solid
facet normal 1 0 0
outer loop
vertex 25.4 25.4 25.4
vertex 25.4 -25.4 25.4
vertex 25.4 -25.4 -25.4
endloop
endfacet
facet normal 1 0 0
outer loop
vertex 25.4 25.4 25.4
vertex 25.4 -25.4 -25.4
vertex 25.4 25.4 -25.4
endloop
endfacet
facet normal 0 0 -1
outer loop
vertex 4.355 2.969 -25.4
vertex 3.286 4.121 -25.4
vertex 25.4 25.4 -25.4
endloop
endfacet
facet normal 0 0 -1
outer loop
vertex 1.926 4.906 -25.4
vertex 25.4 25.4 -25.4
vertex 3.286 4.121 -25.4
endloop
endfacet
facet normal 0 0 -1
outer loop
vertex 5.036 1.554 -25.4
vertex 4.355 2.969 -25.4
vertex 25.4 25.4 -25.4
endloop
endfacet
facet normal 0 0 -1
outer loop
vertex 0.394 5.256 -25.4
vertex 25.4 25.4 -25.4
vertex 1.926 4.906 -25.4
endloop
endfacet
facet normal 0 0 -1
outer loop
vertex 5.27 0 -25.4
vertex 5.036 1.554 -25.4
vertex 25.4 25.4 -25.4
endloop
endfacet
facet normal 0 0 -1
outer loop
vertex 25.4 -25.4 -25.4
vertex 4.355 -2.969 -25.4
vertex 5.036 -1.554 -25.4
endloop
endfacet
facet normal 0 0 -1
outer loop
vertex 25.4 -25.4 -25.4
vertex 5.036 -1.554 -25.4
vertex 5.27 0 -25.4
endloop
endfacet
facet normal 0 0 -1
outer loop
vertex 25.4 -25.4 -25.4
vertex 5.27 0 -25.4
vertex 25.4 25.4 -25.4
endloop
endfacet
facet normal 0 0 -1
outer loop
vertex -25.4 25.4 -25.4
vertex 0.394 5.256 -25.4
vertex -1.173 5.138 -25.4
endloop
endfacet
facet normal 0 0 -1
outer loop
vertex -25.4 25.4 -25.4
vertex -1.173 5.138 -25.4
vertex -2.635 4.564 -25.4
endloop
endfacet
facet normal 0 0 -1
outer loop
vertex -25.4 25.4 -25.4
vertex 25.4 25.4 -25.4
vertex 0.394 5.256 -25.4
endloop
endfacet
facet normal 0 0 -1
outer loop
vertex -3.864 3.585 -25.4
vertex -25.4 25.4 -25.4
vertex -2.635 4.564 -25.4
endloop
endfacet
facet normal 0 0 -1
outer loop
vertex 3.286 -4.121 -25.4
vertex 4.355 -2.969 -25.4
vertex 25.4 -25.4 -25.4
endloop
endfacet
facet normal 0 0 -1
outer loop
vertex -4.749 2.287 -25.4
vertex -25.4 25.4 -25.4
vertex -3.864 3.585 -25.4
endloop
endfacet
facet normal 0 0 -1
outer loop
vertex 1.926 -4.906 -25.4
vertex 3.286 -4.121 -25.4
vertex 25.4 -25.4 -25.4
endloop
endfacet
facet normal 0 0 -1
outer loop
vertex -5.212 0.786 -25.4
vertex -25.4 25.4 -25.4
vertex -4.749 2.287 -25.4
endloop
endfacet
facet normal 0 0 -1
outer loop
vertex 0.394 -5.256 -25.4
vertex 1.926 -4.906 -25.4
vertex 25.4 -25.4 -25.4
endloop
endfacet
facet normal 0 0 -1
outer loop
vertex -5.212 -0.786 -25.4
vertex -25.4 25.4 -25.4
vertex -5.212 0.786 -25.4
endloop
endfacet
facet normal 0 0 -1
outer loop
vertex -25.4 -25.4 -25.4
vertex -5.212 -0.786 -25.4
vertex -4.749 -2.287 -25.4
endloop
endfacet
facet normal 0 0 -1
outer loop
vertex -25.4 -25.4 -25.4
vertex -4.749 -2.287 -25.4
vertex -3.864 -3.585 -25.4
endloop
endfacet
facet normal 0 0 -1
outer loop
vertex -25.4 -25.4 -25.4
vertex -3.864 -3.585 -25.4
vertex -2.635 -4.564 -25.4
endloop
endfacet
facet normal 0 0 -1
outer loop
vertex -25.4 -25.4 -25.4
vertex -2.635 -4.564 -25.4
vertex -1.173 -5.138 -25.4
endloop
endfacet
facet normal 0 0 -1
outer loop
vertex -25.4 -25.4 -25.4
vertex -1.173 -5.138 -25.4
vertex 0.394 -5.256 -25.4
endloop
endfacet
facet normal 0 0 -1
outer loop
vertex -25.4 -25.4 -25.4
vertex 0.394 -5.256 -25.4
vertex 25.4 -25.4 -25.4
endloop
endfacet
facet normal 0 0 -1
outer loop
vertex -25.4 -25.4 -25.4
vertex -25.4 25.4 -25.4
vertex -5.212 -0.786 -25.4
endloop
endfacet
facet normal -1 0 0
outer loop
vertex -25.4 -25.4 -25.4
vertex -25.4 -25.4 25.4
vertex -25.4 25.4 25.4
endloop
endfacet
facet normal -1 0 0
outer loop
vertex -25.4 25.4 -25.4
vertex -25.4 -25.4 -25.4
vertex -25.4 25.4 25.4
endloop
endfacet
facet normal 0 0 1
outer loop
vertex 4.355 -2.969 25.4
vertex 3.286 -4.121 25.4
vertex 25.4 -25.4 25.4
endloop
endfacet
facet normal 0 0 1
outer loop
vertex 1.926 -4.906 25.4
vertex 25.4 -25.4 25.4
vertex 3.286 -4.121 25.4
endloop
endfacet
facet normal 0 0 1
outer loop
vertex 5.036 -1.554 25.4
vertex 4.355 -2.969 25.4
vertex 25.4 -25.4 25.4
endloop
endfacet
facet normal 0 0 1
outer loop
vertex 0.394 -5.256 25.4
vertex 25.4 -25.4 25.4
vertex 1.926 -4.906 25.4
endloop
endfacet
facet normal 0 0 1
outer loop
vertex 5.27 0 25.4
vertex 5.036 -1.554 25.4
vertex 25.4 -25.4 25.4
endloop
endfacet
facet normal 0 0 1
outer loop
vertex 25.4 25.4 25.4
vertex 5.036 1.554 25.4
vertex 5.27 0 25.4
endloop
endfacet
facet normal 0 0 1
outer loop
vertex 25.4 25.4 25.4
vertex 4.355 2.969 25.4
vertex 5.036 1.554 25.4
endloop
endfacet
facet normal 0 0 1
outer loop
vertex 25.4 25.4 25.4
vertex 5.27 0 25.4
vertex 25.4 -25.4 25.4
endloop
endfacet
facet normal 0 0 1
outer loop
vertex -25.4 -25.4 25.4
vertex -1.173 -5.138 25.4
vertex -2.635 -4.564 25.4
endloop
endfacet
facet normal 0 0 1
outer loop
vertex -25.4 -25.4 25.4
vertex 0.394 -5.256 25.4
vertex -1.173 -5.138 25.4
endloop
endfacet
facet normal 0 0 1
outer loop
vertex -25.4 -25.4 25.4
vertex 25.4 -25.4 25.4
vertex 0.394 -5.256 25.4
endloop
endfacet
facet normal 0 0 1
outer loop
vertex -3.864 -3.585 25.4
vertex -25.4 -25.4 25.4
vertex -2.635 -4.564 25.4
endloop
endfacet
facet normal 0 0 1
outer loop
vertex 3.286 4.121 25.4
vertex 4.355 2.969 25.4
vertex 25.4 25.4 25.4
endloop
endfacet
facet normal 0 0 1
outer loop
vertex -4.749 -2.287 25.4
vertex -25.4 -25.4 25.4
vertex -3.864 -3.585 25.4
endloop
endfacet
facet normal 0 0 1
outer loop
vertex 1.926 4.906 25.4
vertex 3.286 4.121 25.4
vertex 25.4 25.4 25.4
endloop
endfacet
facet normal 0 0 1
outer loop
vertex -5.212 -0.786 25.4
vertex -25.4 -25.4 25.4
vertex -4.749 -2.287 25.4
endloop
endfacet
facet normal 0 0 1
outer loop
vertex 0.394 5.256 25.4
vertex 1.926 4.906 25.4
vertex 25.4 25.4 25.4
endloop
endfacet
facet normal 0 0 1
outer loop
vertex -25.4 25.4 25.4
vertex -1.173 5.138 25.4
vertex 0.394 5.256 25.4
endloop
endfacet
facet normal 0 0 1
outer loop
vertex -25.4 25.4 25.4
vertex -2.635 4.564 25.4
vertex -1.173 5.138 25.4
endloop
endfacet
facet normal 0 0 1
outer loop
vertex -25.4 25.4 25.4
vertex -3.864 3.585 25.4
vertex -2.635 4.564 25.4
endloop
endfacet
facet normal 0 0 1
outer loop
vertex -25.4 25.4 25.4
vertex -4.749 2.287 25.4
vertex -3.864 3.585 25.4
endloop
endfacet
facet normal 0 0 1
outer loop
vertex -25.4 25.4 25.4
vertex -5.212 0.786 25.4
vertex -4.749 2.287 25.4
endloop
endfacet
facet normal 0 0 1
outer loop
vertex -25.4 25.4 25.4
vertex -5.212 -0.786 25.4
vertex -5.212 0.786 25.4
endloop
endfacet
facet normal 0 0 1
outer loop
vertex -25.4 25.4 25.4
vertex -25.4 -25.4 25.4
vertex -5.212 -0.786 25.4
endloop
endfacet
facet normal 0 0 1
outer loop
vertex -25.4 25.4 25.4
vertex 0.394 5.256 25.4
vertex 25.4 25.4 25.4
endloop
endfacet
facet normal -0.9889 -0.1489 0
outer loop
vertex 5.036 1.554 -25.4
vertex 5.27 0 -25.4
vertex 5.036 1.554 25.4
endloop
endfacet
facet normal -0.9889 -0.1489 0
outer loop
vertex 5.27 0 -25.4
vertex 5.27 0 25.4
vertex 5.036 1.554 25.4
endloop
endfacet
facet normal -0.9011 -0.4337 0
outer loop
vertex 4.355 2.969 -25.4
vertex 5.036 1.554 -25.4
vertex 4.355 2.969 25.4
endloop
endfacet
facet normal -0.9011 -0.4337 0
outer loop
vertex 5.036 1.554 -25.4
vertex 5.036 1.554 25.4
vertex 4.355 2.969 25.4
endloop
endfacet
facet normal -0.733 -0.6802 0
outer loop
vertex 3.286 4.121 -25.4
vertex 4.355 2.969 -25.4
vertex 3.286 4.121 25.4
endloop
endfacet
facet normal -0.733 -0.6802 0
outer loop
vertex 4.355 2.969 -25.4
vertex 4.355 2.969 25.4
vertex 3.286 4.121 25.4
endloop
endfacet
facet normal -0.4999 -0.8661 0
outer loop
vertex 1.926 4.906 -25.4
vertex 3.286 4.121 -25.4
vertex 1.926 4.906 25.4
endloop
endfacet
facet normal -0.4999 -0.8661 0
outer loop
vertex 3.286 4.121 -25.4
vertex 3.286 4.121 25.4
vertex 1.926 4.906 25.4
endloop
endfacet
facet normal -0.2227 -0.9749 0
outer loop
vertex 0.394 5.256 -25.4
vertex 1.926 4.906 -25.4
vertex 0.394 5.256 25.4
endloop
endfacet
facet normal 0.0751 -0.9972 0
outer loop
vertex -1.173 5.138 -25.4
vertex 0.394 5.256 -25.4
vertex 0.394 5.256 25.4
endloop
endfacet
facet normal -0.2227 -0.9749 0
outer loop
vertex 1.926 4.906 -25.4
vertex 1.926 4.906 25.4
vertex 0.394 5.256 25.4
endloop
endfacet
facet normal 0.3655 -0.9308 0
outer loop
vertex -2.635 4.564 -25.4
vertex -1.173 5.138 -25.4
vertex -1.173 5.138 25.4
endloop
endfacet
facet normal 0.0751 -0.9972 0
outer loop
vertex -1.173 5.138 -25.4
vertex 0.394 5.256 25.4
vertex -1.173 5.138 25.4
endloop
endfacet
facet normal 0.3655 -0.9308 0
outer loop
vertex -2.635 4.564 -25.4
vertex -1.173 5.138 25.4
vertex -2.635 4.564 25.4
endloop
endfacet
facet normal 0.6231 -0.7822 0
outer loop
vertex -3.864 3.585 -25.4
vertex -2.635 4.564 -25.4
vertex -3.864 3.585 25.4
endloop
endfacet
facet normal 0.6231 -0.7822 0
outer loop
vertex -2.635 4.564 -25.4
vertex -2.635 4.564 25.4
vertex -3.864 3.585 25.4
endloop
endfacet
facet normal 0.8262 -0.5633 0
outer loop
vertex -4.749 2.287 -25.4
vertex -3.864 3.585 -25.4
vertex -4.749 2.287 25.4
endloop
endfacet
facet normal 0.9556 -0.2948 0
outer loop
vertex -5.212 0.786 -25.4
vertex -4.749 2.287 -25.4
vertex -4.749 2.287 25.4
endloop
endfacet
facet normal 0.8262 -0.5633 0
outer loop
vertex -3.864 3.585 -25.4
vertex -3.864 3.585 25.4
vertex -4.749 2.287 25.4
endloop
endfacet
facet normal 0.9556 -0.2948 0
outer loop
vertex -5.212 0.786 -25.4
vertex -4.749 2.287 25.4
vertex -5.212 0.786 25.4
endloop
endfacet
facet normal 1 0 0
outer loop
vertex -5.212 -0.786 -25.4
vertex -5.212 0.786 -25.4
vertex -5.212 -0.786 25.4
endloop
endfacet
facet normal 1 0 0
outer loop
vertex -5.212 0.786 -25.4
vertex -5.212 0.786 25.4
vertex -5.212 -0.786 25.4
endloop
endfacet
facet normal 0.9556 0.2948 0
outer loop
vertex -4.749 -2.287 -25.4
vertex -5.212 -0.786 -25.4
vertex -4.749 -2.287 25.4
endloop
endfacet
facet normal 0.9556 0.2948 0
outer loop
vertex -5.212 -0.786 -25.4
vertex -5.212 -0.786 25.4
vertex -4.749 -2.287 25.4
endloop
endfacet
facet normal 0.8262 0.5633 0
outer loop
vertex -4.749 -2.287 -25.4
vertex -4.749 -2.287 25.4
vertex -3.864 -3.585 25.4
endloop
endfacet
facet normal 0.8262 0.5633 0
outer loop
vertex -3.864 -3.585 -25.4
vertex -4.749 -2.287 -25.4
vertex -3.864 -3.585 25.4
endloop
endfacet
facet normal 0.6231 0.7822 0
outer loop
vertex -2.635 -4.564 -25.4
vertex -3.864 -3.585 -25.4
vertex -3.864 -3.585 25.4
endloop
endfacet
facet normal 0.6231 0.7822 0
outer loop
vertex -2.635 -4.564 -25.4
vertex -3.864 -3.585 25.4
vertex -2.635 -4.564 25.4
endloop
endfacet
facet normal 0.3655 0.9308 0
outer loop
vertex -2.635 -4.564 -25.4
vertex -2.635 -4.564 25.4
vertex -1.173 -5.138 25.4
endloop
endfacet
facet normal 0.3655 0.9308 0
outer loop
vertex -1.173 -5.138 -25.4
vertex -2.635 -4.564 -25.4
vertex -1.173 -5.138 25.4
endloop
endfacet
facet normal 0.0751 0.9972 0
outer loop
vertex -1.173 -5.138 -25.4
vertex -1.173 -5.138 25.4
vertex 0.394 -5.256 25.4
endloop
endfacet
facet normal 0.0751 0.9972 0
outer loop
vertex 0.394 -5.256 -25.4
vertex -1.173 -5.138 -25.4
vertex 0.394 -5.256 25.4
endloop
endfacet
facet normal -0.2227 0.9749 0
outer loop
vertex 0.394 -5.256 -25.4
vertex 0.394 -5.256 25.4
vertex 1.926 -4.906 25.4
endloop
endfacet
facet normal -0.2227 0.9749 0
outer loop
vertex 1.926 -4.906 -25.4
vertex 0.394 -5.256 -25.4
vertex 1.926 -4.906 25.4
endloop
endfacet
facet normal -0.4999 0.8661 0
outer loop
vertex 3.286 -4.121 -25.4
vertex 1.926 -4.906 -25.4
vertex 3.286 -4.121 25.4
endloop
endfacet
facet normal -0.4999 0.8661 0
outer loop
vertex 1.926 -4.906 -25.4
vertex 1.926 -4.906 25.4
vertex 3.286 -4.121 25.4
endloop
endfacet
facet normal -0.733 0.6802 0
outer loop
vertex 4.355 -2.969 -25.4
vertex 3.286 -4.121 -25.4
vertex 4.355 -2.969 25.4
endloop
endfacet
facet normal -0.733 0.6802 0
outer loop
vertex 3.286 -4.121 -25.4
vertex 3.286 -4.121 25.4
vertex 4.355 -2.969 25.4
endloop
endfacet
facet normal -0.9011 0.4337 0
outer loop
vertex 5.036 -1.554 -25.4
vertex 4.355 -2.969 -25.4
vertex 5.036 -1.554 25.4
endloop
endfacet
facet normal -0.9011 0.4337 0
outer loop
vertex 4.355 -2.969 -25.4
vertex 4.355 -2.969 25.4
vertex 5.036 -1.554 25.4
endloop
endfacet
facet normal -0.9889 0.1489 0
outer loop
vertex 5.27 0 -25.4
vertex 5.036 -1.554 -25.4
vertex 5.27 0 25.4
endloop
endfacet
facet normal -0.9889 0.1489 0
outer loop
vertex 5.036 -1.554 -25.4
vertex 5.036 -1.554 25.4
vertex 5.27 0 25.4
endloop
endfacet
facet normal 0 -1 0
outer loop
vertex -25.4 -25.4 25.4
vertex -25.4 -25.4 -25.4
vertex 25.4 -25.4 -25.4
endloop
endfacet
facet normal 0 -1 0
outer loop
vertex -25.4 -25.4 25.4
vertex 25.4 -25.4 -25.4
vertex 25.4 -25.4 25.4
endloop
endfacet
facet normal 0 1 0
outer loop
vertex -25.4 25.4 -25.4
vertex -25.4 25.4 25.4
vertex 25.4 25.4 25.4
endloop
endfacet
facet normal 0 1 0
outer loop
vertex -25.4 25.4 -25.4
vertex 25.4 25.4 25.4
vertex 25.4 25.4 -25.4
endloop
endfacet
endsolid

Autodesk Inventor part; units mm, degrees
ref_plane "XY Plane" through (0, 0, 0) normal (0, 0, 1) x (1, 0, 0)
sketch "Sketch1" plane through (0, 0, 0) normal (1, 0, 0) x (0, 1, 0)
  line L0 (-25.4, -25.4) -> (-25.4, 25.4)
  line L1 (-25.4, 25.4) -> (25.4, 25.4)
  line L2 (25.4, 25.4) -> (25.4, -25.4)
  line L3 (25.4, -25.4) -> (-25.4, -25.4)
  line L4 (-25.4, -25.4) -> (25.4, 25.4) construction
  line L5 (-25.4, 25.4) -> (25.4, -25.4) construction
  point P0 (0, 0)
  dimension "d0" = 50.8
  dimension "d1" = 50.8
extrude "Extrusion1" add sketch "Sketch1" along normal mid plane 50.8
sketch "Sketch2" plane through (-25.4, -25.4, 25.4) normal (0, 0, 1) x (1, 0, 0)
  circle A0 centre (25.4, 25.4) radius 5.2705
  dimension "d4" = 10.541
extrude "Extrusion2" cut sketch "Sketch2" against normal through all
properties part number "cylinderForCopy"
